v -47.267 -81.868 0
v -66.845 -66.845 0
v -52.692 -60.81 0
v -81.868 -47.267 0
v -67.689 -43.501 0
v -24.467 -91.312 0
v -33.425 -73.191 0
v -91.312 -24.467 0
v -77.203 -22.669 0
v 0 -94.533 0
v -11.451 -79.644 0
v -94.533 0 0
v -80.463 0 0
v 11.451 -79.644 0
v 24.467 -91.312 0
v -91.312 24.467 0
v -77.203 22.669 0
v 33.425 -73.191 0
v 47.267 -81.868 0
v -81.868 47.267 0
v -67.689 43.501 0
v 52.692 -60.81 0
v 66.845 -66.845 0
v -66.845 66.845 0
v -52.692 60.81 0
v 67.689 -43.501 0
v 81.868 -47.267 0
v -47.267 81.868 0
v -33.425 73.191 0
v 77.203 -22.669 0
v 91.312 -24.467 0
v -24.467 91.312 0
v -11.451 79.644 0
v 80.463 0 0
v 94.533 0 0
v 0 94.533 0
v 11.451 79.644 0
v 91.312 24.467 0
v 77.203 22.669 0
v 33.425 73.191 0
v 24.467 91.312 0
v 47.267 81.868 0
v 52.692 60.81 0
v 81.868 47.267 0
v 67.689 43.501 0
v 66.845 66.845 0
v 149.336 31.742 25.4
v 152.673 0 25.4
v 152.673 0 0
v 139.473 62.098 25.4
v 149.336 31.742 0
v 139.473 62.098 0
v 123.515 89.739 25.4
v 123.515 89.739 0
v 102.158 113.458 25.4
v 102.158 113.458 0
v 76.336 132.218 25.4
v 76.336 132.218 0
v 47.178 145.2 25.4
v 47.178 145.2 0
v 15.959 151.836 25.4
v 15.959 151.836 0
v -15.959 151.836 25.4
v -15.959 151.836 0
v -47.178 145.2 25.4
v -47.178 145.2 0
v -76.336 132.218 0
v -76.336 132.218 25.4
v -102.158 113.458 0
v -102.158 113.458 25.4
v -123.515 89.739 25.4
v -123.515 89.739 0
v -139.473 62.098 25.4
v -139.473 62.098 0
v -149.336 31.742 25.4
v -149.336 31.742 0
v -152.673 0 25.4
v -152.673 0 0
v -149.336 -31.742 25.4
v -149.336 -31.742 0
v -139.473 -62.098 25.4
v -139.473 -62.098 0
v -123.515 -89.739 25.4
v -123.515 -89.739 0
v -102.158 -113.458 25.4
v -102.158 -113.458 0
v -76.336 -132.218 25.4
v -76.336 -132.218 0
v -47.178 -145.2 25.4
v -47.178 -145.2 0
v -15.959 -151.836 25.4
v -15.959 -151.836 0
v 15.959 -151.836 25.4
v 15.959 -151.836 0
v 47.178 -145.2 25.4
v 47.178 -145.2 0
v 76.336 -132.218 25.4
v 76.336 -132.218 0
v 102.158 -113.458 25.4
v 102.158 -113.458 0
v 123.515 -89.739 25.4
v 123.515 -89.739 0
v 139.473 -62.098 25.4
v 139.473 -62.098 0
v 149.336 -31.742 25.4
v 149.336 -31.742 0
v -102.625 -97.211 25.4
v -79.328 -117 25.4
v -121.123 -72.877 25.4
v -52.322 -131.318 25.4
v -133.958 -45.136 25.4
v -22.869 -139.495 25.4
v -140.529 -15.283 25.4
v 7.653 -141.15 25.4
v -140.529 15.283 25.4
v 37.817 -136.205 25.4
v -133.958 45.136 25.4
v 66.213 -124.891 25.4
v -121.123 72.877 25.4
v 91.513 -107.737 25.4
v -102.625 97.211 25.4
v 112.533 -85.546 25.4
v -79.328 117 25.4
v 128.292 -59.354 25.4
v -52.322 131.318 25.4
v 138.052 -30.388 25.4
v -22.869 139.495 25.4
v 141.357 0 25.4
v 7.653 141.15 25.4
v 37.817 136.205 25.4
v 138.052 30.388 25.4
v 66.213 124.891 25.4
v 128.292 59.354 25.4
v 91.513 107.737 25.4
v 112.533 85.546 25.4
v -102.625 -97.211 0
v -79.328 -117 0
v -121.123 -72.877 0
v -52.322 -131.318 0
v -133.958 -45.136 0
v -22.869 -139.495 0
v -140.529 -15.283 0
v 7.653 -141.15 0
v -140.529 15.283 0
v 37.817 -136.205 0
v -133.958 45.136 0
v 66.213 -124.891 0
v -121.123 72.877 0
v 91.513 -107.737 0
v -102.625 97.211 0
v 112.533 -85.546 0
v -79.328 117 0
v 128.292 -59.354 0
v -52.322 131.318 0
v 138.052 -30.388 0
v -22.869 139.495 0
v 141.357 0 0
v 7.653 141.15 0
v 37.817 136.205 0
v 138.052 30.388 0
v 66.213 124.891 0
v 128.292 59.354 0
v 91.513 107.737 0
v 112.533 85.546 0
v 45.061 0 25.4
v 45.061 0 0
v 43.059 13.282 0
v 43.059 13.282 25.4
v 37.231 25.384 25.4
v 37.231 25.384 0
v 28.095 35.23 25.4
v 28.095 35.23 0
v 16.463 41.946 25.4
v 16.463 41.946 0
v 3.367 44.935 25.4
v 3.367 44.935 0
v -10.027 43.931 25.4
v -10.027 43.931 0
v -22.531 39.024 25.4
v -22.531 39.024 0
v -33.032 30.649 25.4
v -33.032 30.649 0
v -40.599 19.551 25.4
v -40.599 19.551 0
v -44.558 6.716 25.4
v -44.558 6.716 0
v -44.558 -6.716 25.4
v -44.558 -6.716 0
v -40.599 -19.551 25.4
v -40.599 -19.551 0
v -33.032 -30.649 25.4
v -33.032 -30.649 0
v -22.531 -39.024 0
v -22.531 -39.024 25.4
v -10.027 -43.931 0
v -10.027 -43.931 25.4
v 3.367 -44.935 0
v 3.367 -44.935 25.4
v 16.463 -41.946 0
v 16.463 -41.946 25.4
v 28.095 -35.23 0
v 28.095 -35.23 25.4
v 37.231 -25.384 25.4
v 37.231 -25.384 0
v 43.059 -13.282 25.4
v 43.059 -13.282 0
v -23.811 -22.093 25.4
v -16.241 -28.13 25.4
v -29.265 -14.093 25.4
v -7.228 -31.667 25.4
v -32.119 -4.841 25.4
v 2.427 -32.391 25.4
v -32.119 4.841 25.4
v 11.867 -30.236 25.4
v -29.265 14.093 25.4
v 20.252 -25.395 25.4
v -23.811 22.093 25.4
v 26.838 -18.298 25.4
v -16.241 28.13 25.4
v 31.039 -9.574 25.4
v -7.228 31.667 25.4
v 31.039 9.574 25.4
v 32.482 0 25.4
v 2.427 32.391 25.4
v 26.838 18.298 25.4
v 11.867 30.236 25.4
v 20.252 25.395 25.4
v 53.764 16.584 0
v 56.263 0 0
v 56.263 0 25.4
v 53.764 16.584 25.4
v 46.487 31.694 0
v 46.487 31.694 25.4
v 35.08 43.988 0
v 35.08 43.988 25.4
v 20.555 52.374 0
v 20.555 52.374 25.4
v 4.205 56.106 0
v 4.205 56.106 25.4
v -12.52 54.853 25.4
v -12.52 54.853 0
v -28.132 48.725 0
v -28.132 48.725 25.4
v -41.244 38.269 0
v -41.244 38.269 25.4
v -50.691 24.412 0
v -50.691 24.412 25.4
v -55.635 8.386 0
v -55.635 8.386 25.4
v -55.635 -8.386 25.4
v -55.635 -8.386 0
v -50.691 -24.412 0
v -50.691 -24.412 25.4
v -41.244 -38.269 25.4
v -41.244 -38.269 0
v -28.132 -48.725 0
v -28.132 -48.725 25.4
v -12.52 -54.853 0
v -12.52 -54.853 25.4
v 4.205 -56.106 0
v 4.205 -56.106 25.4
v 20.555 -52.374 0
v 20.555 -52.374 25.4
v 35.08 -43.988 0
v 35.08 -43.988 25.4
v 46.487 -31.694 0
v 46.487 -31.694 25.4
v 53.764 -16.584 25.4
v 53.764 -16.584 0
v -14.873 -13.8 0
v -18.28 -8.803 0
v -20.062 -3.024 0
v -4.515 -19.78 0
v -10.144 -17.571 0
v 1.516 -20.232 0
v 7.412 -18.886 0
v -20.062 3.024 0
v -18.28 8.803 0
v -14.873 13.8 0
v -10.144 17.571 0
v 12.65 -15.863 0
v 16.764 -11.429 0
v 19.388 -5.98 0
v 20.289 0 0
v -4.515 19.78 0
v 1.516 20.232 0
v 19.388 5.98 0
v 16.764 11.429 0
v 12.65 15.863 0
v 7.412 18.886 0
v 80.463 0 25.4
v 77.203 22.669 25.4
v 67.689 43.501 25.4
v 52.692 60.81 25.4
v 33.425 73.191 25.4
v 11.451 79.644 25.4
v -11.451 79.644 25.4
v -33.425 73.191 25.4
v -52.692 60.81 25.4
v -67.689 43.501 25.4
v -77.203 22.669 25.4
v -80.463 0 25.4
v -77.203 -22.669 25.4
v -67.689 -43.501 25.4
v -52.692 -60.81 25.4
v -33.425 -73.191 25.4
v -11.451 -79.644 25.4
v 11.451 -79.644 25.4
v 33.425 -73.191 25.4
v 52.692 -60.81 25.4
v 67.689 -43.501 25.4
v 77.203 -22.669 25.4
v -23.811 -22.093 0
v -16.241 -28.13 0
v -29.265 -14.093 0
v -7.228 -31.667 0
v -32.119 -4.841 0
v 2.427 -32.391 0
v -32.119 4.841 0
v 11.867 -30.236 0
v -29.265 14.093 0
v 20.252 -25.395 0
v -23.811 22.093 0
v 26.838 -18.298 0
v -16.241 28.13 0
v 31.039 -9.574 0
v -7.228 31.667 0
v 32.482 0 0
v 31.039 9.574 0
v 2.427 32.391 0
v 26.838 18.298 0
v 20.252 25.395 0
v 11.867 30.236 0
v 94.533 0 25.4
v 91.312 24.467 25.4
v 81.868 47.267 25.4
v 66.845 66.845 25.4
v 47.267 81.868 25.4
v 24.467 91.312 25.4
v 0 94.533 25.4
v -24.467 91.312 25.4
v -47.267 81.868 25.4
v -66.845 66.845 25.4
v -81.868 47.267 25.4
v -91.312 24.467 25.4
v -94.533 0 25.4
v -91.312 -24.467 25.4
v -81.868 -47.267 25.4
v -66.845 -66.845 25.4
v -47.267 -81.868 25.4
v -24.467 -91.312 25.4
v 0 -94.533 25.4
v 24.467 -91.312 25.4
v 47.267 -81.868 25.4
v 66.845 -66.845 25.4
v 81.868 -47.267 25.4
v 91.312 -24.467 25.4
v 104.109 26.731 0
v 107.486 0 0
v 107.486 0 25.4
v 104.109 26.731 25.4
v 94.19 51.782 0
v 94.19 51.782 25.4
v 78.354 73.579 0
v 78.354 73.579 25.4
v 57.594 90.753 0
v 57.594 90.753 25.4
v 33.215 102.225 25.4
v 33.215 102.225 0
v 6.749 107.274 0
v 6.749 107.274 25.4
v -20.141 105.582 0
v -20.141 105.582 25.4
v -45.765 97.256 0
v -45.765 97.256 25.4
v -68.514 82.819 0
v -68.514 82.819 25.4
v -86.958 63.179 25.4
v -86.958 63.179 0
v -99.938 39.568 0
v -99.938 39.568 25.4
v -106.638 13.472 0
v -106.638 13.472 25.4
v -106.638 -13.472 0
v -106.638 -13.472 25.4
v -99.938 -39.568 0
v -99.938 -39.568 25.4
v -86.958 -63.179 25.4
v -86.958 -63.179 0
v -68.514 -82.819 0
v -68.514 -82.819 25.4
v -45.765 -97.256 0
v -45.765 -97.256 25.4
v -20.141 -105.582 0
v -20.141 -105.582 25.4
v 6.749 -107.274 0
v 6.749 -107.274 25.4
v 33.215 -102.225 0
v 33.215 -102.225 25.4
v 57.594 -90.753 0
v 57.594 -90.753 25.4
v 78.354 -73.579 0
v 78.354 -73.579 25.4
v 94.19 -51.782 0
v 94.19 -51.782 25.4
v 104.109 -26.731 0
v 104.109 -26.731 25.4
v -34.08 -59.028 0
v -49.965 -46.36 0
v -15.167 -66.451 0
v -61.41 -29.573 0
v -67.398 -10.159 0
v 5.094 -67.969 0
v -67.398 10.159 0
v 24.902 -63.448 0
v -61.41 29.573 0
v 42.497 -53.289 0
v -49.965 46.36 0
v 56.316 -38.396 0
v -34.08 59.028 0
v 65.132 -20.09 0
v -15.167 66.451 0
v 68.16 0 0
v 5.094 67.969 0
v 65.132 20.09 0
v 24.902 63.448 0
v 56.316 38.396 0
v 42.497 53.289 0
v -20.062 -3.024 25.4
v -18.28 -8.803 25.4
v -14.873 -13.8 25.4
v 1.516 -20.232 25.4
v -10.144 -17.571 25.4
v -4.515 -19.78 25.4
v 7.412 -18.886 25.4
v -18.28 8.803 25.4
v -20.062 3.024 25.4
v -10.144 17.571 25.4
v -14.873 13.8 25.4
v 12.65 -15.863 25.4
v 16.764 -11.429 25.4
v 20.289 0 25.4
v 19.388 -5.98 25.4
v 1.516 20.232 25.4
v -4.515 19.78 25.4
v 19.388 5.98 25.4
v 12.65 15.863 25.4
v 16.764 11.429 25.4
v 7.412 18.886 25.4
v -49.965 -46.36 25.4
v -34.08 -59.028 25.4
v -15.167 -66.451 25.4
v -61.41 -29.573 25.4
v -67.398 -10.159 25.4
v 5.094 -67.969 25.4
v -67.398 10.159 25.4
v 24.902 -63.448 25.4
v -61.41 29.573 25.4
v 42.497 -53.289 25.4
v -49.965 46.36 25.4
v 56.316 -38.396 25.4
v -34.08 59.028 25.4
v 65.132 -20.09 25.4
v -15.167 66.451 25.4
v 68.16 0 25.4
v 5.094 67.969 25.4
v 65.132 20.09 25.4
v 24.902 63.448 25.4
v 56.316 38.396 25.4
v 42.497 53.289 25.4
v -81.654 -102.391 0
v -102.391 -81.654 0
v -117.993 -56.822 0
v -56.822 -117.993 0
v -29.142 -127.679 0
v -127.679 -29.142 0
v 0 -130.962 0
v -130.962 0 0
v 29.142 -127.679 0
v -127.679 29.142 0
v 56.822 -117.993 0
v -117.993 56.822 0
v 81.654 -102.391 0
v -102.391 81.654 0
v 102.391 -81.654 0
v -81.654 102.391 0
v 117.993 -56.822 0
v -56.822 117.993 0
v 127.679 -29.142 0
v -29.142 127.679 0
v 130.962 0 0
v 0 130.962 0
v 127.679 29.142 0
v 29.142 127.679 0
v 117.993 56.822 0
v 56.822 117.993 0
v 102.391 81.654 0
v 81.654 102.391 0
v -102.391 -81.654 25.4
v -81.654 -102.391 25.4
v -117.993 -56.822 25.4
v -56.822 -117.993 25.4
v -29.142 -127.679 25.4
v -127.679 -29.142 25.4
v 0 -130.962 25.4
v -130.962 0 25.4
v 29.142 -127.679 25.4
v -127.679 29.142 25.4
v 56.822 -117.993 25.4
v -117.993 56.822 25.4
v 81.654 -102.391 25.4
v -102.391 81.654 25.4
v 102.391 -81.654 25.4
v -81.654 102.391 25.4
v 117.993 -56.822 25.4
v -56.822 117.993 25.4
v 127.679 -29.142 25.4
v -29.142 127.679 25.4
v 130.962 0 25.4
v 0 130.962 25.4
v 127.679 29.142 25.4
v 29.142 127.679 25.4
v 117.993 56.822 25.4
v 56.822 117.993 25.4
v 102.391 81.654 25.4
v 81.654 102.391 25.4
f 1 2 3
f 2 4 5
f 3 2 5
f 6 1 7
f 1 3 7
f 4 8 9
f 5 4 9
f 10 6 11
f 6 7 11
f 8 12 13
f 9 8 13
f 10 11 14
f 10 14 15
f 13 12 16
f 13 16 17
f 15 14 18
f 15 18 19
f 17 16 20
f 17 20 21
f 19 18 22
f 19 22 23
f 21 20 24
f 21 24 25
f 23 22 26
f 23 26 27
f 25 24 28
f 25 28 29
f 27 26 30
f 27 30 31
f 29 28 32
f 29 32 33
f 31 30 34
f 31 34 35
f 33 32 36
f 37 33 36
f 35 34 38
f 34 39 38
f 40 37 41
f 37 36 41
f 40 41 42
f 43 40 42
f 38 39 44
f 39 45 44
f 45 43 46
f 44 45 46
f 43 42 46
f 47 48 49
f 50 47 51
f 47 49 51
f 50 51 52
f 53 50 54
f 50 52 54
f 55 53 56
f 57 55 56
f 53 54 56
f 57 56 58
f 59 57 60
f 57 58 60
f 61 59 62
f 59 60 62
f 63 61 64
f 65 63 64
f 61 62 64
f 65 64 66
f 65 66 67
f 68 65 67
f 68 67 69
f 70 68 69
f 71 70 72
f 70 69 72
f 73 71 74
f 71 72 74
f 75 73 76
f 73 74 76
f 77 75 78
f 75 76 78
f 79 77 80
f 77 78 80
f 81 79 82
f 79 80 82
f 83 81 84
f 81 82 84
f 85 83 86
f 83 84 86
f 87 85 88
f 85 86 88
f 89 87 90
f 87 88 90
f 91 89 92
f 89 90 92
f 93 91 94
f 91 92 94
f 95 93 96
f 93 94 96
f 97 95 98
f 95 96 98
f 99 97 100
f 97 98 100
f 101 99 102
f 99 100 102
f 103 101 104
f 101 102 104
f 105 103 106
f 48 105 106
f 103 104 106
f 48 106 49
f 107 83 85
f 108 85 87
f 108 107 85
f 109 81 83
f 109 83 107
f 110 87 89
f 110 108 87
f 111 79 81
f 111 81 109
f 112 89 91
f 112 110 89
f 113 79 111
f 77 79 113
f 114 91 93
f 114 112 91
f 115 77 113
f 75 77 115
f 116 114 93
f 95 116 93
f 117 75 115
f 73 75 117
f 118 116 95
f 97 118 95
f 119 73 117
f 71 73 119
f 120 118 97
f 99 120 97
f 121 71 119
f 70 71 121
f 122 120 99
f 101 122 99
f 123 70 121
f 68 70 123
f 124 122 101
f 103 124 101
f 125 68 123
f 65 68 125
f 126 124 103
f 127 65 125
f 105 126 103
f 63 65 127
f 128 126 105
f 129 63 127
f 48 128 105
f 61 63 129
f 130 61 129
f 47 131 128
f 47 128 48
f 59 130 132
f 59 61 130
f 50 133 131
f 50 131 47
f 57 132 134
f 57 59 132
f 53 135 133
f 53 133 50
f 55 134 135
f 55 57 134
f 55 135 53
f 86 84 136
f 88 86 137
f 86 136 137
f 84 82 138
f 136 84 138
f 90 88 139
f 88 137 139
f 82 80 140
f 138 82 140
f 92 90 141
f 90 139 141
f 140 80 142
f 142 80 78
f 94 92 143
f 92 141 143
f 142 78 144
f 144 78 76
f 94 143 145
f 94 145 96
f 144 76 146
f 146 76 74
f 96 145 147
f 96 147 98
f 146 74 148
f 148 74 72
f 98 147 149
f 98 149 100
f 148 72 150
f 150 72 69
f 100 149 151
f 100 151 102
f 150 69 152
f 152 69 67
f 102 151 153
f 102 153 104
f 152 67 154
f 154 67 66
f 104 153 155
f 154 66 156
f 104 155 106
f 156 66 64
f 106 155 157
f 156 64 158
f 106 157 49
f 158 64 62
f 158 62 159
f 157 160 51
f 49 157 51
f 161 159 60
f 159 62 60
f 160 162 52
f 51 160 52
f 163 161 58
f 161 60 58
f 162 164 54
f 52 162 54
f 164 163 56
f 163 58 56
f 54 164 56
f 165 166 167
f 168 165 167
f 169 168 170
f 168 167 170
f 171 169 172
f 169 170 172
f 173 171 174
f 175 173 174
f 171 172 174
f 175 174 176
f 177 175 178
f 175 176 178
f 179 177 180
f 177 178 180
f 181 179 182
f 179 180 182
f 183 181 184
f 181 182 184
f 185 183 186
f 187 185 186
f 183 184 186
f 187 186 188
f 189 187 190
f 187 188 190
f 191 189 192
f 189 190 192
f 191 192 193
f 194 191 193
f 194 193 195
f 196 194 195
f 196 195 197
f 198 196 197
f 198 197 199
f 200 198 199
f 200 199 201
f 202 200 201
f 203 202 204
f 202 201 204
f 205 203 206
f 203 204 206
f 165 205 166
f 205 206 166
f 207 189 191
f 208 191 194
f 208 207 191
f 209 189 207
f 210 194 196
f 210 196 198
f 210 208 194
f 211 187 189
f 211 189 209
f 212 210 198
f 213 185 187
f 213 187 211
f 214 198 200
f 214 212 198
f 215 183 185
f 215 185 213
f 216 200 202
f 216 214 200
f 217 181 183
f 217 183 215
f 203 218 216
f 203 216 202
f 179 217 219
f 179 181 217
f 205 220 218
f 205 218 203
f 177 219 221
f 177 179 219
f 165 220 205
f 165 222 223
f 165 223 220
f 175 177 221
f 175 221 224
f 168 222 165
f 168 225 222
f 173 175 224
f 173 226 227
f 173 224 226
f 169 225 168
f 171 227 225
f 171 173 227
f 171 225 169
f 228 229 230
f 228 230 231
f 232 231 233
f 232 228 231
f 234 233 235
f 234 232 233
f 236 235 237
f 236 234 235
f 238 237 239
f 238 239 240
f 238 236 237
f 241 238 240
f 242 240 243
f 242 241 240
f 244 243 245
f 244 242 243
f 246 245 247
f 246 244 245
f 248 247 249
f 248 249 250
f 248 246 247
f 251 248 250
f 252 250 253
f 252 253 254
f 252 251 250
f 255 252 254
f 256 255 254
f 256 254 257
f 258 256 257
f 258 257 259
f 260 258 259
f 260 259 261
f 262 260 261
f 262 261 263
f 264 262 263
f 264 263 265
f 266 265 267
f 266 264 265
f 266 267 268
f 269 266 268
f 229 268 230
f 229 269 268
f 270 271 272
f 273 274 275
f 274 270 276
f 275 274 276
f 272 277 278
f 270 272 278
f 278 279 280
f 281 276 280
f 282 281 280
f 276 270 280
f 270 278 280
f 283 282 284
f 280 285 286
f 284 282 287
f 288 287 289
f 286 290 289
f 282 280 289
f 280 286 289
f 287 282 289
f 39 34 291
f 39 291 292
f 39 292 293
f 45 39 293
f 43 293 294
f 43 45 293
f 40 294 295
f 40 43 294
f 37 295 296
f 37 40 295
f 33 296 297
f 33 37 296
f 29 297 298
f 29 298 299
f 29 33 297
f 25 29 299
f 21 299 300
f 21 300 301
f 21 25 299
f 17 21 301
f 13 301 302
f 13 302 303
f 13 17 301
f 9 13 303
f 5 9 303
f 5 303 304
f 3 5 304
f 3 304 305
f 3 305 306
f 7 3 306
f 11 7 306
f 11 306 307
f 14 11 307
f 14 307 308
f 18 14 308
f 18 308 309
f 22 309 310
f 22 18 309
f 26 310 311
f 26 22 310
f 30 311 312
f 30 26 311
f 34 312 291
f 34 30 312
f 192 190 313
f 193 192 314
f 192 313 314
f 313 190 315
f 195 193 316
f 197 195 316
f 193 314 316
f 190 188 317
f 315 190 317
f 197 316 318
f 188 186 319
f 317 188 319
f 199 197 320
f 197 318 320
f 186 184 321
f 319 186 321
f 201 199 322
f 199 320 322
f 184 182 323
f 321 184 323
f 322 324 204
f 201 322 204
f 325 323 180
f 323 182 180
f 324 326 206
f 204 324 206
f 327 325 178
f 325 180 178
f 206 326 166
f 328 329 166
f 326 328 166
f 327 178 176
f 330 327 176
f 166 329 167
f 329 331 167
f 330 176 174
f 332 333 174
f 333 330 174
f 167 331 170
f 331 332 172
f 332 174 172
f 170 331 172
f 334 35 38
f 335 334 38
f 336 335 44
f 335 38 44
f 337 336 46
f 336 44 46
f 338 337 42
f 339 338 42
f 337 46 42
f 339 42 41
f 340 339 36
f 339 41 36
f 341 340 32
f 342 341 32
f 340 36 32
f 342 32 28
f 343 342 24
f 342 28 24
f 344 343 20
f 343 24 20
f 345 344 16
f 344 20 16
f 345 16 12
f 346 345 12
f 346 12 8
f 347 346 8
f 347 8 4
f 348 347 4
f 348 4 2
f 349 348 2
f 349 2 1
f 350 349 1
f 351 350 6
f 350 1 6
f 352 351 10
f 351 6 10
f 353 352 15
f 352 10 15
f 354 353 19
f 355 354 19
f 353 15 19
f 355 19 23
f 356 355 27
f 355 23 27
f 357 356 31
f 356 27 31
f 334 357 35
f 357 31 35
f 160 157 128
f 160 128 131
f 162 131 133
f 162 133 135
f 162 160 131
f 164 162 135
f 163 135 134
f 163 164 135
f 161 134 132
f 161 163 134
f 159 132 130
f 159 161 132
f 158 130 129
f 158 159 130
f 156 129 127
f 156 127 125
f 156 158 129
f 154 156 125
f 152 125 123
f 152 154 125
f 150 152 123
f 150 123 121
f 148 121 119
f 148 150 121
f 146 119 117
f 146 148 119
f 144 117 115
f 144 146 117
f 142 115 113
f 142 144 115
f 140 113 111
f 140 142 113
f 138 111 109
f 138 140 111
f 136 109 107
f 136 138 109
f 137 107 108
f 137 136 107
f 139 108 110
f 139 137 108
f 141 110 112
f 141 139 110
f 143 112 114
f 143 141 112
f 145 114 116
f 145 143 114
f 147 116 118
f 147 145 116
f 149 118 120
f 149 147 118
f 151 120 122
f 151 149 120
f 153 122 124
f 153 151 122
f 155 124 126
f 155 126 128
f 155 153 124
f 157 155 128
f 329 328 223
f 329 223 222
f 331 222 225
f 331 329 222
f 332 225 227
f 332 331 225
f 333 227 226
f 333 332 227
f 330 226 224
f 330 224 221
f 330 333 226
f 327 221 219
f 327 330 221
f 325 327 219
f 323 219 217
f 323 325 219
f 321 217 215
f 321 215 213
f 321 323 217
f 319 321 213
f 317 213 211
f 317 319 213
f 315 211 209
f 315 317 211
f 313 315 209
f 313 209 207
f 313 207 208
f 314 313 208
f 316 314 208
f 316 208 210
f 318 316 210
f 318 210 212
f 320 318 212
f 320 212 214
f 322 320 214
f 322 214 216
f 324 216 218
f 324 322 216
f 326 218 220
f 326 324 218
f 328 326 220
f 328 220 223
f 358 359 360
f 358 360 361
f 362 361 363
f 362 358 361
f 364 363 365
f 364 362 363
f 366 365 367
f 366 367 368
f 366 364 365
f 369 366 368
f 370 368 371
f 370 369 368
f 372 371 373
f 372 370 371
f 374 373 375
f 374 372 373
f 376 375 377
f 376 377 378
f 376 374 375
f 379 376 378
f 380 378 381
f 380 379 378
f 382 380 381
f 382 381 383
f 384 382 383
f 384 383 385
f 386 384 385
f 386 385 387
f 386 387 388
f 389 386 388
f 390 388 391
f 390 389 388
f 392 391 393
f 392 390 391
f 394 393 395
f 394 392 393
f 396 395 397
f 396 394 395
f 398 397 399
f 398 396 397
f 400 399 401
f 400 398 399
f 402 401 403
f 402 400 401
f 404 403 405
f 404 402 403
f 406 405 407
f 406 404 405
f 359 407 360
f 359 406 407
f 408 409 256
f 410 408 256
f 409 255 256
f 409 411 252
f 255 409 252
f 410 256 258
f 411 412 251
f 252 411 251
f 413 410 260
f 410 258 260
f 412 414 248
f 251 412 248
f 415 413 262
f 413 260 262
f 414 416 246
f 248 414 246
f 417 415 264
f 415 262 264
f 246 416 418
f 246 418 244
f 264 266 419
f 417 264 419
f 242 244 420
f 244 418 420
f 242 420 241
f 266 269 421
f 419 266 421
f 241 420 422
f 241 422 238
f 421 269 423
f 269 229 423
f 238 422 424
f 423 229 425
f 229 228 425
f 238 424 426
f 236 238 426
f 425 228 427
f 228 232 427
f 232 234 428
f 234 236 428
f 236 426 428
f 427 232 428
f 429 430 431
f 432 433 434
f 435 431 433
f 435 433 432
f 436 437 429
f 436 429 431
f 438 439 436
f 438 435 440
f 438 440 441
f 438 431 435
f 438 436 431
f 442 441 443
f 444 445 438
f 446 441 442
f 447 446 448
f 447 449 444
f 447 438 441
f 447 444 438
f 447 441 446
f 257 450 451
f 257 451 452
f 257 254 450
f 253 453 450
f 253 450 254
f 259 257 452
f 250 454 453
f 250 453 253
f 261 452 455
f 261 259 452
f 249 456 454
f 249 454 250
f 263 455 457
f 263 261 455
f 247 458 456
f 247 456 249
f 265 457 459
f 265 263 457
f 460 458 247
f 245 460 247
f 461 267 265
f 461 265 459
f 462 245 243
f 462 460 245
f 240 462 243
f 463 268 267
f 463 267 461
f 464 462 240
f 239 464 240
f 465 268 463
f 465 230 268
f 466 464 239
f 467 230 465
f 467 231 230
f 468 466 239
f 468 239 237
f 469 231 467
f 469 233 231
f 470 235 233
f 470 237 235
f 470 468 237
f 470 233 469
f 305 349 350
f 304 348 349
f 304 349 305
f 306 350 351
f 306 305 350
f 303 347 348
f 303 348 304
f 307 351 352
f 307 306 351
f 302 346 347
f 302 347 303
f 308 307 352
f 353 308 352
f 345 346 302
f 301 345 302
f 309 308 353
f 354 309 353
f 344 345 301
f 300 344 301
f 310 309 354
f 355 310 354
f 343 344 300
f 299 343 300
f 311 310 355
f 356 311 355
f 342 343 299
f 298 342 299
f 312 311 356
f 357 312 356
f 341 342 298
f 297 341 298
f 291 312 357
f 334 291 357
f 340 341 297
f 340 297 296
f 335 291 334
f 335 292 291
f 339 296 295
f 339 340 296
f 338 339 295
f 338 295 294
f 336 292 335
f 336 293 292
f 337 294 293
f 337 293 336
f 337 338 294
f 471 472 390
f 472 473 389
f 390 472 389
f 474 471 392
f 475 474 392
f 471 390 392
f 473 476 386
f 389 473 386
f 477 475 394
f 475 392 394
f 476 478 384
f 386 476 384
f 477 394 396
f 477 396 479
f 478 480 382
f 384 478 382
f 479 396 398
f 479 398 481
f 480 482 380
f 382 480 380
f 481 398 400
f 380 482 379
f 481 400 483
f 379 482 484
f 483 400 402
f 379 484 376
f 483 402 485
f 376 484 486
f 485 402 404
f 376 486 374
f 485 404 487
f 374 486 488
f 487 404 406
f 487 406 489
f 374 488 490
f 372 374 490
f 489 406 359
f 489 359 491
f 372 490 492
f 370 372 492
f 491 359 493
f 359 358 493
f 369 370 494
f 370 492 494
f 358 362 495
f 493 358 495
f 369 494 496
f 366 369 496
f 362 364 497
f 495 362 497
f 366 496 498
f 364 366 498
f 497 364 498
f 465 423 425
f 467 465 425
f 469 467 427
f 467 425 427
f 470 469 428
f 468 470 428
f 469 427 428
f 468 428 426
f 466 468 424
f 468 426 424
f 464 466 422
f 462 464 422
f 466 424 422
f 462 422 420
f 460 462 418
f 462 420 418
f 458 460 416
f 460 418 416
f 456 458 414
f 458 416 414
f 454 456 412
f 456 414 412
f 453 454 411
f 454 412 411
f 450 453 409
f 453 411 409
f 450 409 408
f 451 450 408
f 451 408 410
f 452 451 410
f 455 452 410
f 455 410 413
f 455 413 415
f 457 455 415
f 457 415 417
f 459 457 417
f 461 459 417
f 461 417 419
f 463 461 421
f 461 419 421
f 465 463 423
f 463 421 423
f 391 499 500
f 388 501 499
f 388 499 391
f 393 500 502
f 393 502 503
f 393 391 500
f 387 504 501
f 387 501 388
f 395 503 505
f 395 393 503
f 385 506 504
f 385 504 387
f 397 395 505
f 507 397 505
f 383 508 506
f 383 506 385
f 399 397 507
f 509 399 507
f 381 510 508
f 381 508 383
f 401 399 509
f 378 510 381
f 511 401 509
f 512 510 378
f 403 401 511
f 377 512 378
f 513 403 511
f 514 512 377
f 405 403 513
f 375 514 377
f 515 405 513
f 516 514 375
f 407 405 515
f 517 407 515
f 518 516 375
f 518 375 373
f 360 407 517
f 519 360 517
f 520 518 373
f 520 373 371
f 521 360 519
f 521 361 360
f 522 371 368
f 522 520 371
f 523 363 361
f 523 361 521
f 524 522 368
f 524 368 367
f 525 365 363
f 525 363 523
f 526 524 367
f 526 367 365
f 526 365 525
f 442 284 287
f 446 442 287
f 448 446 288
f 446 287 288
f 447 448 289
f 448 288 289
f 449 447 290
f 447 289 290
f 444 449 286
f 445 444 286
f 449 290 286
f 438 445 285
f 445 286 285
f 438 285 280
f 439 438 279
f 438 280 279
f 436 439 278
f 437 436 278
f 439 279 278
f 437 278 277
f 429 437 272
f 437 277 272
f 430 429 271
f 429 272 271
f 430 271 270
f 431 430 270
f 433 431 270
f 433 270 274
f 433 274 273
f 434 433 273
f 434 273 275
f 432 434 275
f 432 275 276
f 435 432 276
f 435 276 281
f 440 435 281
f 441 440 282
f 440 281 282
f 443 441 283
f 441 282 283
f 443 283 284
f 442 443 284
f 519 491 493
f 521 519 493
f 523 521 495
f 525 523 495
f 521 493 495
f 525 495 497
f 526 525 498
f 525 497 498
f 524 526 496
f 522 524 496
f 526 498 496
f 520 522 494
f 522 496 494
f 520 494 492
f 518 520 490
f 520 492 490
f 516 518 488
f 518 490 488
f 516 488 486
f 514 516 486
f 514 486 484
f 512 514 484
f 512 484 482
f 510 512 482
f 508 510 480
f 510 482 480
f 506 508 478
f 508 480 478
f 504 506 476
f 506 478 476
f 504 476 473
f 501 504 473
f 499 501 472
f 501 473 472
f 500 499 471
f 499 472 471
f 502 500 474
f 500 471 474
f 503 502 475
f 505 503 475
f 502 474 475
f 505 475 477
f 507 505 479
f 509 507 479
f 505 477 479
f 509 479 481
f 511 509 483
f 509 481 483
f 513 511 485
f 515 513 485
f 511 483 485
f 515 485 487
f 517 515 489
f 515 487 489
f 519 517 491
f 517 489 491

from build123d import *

# Parameters (mm, degrees)
F0_R     = 152.6727266887
F0_R_2   = 141.3572157694
F1_DEPTH = 25.4
F0_R_3   = 20.2889524638
F0_R_4   = 14.4472171752
F0_R_5   = 9.0833704394
F0_R_6   = 4.952842328
F0_R_7   = 45.061229223
F0_R_8   = 32.481784501
F0_R_9   = 68.1597746354
F0_R_10  = 56.2632048915
F0_R_11  = 94.5333203262
F0_R_12  = 80.4625394079
F0_R_13  = 130.9623975477
F0_R_14  = 119.1809039493
F0_R_15  = 107.4857430574


with BuildPart() as f1:
    # F0 (on Top) → F1 (new body)
    with BuildSketch(Plane.XY):
        Circle(F0_R)
        Circle(F0_R_2, mode=Mode.SUBTRACT)
    extrude(amount=F1_DEPTH)


with BuildPart() as f1b:
    # F0 (on Top) → F1, piece 2 (new body)
    with BuildSketch(Plane.XY):
        Circle(F0_R_3)
        Circle(F0_R_4, mode=Mode.SUBTRACT)
        Circle(F0_R_4)
        Circle(F0_R_5, mode=Mode.SUBTRACT)
        Circle(F0_R_5)
        Circle(F0_R_6, mode=Mode.SUBTRACT)
        Circle(F0_R_6)
    extrude(amount=F1_DEPTH)


with BuildPart() as f1c:
    # F0 (on Top) → F1, piece 3 (new body)
    with BuildSketch(Plane.XY):
        Circle(F0_R_7)
        Circle(F0_R_8, mode=Mode.SUBTRACT)
    extrude(amount=F1_DEPTH)


with BuildPart() as f1d:
    # F0 (on Top) → F1, piece 4 (new body)
    with BuildSketch(Plane.XY):
        Circle(F0_R_9)
        Circle(F0_R_10, mode=Mode.SUBTRACT)
    extrude(amount=F1_DEPTH)


with BuildPart() as f1e:
    # F0 (on Top) → F1, piece 5 (new body)
    with BuildSketch(Plane.XY):
        Circle(F0_R_11)
        Circle(F0_R_12, mode=Mode.SUBTRACT)
    extrude(amount=F1_DEPTH)


with BuildPart() as f1f:
    # F0 (on Top) → F1, piece 6 (new body)
    with BuildSketch(Plane.XY):
        Circle(F0_R_13)
        Circle(F0_R_14, mode=Mode.SUBTRACT)
        Circle(F0_R_14)
        Circle(F0_R_15, mode=Mode.SUBTRACT)
    extrude(amount=F1_DEPTH)


solid = Compound([f1.part, f1b.part, f1c.part, f1d.part, f1e.part, f1f.part])
